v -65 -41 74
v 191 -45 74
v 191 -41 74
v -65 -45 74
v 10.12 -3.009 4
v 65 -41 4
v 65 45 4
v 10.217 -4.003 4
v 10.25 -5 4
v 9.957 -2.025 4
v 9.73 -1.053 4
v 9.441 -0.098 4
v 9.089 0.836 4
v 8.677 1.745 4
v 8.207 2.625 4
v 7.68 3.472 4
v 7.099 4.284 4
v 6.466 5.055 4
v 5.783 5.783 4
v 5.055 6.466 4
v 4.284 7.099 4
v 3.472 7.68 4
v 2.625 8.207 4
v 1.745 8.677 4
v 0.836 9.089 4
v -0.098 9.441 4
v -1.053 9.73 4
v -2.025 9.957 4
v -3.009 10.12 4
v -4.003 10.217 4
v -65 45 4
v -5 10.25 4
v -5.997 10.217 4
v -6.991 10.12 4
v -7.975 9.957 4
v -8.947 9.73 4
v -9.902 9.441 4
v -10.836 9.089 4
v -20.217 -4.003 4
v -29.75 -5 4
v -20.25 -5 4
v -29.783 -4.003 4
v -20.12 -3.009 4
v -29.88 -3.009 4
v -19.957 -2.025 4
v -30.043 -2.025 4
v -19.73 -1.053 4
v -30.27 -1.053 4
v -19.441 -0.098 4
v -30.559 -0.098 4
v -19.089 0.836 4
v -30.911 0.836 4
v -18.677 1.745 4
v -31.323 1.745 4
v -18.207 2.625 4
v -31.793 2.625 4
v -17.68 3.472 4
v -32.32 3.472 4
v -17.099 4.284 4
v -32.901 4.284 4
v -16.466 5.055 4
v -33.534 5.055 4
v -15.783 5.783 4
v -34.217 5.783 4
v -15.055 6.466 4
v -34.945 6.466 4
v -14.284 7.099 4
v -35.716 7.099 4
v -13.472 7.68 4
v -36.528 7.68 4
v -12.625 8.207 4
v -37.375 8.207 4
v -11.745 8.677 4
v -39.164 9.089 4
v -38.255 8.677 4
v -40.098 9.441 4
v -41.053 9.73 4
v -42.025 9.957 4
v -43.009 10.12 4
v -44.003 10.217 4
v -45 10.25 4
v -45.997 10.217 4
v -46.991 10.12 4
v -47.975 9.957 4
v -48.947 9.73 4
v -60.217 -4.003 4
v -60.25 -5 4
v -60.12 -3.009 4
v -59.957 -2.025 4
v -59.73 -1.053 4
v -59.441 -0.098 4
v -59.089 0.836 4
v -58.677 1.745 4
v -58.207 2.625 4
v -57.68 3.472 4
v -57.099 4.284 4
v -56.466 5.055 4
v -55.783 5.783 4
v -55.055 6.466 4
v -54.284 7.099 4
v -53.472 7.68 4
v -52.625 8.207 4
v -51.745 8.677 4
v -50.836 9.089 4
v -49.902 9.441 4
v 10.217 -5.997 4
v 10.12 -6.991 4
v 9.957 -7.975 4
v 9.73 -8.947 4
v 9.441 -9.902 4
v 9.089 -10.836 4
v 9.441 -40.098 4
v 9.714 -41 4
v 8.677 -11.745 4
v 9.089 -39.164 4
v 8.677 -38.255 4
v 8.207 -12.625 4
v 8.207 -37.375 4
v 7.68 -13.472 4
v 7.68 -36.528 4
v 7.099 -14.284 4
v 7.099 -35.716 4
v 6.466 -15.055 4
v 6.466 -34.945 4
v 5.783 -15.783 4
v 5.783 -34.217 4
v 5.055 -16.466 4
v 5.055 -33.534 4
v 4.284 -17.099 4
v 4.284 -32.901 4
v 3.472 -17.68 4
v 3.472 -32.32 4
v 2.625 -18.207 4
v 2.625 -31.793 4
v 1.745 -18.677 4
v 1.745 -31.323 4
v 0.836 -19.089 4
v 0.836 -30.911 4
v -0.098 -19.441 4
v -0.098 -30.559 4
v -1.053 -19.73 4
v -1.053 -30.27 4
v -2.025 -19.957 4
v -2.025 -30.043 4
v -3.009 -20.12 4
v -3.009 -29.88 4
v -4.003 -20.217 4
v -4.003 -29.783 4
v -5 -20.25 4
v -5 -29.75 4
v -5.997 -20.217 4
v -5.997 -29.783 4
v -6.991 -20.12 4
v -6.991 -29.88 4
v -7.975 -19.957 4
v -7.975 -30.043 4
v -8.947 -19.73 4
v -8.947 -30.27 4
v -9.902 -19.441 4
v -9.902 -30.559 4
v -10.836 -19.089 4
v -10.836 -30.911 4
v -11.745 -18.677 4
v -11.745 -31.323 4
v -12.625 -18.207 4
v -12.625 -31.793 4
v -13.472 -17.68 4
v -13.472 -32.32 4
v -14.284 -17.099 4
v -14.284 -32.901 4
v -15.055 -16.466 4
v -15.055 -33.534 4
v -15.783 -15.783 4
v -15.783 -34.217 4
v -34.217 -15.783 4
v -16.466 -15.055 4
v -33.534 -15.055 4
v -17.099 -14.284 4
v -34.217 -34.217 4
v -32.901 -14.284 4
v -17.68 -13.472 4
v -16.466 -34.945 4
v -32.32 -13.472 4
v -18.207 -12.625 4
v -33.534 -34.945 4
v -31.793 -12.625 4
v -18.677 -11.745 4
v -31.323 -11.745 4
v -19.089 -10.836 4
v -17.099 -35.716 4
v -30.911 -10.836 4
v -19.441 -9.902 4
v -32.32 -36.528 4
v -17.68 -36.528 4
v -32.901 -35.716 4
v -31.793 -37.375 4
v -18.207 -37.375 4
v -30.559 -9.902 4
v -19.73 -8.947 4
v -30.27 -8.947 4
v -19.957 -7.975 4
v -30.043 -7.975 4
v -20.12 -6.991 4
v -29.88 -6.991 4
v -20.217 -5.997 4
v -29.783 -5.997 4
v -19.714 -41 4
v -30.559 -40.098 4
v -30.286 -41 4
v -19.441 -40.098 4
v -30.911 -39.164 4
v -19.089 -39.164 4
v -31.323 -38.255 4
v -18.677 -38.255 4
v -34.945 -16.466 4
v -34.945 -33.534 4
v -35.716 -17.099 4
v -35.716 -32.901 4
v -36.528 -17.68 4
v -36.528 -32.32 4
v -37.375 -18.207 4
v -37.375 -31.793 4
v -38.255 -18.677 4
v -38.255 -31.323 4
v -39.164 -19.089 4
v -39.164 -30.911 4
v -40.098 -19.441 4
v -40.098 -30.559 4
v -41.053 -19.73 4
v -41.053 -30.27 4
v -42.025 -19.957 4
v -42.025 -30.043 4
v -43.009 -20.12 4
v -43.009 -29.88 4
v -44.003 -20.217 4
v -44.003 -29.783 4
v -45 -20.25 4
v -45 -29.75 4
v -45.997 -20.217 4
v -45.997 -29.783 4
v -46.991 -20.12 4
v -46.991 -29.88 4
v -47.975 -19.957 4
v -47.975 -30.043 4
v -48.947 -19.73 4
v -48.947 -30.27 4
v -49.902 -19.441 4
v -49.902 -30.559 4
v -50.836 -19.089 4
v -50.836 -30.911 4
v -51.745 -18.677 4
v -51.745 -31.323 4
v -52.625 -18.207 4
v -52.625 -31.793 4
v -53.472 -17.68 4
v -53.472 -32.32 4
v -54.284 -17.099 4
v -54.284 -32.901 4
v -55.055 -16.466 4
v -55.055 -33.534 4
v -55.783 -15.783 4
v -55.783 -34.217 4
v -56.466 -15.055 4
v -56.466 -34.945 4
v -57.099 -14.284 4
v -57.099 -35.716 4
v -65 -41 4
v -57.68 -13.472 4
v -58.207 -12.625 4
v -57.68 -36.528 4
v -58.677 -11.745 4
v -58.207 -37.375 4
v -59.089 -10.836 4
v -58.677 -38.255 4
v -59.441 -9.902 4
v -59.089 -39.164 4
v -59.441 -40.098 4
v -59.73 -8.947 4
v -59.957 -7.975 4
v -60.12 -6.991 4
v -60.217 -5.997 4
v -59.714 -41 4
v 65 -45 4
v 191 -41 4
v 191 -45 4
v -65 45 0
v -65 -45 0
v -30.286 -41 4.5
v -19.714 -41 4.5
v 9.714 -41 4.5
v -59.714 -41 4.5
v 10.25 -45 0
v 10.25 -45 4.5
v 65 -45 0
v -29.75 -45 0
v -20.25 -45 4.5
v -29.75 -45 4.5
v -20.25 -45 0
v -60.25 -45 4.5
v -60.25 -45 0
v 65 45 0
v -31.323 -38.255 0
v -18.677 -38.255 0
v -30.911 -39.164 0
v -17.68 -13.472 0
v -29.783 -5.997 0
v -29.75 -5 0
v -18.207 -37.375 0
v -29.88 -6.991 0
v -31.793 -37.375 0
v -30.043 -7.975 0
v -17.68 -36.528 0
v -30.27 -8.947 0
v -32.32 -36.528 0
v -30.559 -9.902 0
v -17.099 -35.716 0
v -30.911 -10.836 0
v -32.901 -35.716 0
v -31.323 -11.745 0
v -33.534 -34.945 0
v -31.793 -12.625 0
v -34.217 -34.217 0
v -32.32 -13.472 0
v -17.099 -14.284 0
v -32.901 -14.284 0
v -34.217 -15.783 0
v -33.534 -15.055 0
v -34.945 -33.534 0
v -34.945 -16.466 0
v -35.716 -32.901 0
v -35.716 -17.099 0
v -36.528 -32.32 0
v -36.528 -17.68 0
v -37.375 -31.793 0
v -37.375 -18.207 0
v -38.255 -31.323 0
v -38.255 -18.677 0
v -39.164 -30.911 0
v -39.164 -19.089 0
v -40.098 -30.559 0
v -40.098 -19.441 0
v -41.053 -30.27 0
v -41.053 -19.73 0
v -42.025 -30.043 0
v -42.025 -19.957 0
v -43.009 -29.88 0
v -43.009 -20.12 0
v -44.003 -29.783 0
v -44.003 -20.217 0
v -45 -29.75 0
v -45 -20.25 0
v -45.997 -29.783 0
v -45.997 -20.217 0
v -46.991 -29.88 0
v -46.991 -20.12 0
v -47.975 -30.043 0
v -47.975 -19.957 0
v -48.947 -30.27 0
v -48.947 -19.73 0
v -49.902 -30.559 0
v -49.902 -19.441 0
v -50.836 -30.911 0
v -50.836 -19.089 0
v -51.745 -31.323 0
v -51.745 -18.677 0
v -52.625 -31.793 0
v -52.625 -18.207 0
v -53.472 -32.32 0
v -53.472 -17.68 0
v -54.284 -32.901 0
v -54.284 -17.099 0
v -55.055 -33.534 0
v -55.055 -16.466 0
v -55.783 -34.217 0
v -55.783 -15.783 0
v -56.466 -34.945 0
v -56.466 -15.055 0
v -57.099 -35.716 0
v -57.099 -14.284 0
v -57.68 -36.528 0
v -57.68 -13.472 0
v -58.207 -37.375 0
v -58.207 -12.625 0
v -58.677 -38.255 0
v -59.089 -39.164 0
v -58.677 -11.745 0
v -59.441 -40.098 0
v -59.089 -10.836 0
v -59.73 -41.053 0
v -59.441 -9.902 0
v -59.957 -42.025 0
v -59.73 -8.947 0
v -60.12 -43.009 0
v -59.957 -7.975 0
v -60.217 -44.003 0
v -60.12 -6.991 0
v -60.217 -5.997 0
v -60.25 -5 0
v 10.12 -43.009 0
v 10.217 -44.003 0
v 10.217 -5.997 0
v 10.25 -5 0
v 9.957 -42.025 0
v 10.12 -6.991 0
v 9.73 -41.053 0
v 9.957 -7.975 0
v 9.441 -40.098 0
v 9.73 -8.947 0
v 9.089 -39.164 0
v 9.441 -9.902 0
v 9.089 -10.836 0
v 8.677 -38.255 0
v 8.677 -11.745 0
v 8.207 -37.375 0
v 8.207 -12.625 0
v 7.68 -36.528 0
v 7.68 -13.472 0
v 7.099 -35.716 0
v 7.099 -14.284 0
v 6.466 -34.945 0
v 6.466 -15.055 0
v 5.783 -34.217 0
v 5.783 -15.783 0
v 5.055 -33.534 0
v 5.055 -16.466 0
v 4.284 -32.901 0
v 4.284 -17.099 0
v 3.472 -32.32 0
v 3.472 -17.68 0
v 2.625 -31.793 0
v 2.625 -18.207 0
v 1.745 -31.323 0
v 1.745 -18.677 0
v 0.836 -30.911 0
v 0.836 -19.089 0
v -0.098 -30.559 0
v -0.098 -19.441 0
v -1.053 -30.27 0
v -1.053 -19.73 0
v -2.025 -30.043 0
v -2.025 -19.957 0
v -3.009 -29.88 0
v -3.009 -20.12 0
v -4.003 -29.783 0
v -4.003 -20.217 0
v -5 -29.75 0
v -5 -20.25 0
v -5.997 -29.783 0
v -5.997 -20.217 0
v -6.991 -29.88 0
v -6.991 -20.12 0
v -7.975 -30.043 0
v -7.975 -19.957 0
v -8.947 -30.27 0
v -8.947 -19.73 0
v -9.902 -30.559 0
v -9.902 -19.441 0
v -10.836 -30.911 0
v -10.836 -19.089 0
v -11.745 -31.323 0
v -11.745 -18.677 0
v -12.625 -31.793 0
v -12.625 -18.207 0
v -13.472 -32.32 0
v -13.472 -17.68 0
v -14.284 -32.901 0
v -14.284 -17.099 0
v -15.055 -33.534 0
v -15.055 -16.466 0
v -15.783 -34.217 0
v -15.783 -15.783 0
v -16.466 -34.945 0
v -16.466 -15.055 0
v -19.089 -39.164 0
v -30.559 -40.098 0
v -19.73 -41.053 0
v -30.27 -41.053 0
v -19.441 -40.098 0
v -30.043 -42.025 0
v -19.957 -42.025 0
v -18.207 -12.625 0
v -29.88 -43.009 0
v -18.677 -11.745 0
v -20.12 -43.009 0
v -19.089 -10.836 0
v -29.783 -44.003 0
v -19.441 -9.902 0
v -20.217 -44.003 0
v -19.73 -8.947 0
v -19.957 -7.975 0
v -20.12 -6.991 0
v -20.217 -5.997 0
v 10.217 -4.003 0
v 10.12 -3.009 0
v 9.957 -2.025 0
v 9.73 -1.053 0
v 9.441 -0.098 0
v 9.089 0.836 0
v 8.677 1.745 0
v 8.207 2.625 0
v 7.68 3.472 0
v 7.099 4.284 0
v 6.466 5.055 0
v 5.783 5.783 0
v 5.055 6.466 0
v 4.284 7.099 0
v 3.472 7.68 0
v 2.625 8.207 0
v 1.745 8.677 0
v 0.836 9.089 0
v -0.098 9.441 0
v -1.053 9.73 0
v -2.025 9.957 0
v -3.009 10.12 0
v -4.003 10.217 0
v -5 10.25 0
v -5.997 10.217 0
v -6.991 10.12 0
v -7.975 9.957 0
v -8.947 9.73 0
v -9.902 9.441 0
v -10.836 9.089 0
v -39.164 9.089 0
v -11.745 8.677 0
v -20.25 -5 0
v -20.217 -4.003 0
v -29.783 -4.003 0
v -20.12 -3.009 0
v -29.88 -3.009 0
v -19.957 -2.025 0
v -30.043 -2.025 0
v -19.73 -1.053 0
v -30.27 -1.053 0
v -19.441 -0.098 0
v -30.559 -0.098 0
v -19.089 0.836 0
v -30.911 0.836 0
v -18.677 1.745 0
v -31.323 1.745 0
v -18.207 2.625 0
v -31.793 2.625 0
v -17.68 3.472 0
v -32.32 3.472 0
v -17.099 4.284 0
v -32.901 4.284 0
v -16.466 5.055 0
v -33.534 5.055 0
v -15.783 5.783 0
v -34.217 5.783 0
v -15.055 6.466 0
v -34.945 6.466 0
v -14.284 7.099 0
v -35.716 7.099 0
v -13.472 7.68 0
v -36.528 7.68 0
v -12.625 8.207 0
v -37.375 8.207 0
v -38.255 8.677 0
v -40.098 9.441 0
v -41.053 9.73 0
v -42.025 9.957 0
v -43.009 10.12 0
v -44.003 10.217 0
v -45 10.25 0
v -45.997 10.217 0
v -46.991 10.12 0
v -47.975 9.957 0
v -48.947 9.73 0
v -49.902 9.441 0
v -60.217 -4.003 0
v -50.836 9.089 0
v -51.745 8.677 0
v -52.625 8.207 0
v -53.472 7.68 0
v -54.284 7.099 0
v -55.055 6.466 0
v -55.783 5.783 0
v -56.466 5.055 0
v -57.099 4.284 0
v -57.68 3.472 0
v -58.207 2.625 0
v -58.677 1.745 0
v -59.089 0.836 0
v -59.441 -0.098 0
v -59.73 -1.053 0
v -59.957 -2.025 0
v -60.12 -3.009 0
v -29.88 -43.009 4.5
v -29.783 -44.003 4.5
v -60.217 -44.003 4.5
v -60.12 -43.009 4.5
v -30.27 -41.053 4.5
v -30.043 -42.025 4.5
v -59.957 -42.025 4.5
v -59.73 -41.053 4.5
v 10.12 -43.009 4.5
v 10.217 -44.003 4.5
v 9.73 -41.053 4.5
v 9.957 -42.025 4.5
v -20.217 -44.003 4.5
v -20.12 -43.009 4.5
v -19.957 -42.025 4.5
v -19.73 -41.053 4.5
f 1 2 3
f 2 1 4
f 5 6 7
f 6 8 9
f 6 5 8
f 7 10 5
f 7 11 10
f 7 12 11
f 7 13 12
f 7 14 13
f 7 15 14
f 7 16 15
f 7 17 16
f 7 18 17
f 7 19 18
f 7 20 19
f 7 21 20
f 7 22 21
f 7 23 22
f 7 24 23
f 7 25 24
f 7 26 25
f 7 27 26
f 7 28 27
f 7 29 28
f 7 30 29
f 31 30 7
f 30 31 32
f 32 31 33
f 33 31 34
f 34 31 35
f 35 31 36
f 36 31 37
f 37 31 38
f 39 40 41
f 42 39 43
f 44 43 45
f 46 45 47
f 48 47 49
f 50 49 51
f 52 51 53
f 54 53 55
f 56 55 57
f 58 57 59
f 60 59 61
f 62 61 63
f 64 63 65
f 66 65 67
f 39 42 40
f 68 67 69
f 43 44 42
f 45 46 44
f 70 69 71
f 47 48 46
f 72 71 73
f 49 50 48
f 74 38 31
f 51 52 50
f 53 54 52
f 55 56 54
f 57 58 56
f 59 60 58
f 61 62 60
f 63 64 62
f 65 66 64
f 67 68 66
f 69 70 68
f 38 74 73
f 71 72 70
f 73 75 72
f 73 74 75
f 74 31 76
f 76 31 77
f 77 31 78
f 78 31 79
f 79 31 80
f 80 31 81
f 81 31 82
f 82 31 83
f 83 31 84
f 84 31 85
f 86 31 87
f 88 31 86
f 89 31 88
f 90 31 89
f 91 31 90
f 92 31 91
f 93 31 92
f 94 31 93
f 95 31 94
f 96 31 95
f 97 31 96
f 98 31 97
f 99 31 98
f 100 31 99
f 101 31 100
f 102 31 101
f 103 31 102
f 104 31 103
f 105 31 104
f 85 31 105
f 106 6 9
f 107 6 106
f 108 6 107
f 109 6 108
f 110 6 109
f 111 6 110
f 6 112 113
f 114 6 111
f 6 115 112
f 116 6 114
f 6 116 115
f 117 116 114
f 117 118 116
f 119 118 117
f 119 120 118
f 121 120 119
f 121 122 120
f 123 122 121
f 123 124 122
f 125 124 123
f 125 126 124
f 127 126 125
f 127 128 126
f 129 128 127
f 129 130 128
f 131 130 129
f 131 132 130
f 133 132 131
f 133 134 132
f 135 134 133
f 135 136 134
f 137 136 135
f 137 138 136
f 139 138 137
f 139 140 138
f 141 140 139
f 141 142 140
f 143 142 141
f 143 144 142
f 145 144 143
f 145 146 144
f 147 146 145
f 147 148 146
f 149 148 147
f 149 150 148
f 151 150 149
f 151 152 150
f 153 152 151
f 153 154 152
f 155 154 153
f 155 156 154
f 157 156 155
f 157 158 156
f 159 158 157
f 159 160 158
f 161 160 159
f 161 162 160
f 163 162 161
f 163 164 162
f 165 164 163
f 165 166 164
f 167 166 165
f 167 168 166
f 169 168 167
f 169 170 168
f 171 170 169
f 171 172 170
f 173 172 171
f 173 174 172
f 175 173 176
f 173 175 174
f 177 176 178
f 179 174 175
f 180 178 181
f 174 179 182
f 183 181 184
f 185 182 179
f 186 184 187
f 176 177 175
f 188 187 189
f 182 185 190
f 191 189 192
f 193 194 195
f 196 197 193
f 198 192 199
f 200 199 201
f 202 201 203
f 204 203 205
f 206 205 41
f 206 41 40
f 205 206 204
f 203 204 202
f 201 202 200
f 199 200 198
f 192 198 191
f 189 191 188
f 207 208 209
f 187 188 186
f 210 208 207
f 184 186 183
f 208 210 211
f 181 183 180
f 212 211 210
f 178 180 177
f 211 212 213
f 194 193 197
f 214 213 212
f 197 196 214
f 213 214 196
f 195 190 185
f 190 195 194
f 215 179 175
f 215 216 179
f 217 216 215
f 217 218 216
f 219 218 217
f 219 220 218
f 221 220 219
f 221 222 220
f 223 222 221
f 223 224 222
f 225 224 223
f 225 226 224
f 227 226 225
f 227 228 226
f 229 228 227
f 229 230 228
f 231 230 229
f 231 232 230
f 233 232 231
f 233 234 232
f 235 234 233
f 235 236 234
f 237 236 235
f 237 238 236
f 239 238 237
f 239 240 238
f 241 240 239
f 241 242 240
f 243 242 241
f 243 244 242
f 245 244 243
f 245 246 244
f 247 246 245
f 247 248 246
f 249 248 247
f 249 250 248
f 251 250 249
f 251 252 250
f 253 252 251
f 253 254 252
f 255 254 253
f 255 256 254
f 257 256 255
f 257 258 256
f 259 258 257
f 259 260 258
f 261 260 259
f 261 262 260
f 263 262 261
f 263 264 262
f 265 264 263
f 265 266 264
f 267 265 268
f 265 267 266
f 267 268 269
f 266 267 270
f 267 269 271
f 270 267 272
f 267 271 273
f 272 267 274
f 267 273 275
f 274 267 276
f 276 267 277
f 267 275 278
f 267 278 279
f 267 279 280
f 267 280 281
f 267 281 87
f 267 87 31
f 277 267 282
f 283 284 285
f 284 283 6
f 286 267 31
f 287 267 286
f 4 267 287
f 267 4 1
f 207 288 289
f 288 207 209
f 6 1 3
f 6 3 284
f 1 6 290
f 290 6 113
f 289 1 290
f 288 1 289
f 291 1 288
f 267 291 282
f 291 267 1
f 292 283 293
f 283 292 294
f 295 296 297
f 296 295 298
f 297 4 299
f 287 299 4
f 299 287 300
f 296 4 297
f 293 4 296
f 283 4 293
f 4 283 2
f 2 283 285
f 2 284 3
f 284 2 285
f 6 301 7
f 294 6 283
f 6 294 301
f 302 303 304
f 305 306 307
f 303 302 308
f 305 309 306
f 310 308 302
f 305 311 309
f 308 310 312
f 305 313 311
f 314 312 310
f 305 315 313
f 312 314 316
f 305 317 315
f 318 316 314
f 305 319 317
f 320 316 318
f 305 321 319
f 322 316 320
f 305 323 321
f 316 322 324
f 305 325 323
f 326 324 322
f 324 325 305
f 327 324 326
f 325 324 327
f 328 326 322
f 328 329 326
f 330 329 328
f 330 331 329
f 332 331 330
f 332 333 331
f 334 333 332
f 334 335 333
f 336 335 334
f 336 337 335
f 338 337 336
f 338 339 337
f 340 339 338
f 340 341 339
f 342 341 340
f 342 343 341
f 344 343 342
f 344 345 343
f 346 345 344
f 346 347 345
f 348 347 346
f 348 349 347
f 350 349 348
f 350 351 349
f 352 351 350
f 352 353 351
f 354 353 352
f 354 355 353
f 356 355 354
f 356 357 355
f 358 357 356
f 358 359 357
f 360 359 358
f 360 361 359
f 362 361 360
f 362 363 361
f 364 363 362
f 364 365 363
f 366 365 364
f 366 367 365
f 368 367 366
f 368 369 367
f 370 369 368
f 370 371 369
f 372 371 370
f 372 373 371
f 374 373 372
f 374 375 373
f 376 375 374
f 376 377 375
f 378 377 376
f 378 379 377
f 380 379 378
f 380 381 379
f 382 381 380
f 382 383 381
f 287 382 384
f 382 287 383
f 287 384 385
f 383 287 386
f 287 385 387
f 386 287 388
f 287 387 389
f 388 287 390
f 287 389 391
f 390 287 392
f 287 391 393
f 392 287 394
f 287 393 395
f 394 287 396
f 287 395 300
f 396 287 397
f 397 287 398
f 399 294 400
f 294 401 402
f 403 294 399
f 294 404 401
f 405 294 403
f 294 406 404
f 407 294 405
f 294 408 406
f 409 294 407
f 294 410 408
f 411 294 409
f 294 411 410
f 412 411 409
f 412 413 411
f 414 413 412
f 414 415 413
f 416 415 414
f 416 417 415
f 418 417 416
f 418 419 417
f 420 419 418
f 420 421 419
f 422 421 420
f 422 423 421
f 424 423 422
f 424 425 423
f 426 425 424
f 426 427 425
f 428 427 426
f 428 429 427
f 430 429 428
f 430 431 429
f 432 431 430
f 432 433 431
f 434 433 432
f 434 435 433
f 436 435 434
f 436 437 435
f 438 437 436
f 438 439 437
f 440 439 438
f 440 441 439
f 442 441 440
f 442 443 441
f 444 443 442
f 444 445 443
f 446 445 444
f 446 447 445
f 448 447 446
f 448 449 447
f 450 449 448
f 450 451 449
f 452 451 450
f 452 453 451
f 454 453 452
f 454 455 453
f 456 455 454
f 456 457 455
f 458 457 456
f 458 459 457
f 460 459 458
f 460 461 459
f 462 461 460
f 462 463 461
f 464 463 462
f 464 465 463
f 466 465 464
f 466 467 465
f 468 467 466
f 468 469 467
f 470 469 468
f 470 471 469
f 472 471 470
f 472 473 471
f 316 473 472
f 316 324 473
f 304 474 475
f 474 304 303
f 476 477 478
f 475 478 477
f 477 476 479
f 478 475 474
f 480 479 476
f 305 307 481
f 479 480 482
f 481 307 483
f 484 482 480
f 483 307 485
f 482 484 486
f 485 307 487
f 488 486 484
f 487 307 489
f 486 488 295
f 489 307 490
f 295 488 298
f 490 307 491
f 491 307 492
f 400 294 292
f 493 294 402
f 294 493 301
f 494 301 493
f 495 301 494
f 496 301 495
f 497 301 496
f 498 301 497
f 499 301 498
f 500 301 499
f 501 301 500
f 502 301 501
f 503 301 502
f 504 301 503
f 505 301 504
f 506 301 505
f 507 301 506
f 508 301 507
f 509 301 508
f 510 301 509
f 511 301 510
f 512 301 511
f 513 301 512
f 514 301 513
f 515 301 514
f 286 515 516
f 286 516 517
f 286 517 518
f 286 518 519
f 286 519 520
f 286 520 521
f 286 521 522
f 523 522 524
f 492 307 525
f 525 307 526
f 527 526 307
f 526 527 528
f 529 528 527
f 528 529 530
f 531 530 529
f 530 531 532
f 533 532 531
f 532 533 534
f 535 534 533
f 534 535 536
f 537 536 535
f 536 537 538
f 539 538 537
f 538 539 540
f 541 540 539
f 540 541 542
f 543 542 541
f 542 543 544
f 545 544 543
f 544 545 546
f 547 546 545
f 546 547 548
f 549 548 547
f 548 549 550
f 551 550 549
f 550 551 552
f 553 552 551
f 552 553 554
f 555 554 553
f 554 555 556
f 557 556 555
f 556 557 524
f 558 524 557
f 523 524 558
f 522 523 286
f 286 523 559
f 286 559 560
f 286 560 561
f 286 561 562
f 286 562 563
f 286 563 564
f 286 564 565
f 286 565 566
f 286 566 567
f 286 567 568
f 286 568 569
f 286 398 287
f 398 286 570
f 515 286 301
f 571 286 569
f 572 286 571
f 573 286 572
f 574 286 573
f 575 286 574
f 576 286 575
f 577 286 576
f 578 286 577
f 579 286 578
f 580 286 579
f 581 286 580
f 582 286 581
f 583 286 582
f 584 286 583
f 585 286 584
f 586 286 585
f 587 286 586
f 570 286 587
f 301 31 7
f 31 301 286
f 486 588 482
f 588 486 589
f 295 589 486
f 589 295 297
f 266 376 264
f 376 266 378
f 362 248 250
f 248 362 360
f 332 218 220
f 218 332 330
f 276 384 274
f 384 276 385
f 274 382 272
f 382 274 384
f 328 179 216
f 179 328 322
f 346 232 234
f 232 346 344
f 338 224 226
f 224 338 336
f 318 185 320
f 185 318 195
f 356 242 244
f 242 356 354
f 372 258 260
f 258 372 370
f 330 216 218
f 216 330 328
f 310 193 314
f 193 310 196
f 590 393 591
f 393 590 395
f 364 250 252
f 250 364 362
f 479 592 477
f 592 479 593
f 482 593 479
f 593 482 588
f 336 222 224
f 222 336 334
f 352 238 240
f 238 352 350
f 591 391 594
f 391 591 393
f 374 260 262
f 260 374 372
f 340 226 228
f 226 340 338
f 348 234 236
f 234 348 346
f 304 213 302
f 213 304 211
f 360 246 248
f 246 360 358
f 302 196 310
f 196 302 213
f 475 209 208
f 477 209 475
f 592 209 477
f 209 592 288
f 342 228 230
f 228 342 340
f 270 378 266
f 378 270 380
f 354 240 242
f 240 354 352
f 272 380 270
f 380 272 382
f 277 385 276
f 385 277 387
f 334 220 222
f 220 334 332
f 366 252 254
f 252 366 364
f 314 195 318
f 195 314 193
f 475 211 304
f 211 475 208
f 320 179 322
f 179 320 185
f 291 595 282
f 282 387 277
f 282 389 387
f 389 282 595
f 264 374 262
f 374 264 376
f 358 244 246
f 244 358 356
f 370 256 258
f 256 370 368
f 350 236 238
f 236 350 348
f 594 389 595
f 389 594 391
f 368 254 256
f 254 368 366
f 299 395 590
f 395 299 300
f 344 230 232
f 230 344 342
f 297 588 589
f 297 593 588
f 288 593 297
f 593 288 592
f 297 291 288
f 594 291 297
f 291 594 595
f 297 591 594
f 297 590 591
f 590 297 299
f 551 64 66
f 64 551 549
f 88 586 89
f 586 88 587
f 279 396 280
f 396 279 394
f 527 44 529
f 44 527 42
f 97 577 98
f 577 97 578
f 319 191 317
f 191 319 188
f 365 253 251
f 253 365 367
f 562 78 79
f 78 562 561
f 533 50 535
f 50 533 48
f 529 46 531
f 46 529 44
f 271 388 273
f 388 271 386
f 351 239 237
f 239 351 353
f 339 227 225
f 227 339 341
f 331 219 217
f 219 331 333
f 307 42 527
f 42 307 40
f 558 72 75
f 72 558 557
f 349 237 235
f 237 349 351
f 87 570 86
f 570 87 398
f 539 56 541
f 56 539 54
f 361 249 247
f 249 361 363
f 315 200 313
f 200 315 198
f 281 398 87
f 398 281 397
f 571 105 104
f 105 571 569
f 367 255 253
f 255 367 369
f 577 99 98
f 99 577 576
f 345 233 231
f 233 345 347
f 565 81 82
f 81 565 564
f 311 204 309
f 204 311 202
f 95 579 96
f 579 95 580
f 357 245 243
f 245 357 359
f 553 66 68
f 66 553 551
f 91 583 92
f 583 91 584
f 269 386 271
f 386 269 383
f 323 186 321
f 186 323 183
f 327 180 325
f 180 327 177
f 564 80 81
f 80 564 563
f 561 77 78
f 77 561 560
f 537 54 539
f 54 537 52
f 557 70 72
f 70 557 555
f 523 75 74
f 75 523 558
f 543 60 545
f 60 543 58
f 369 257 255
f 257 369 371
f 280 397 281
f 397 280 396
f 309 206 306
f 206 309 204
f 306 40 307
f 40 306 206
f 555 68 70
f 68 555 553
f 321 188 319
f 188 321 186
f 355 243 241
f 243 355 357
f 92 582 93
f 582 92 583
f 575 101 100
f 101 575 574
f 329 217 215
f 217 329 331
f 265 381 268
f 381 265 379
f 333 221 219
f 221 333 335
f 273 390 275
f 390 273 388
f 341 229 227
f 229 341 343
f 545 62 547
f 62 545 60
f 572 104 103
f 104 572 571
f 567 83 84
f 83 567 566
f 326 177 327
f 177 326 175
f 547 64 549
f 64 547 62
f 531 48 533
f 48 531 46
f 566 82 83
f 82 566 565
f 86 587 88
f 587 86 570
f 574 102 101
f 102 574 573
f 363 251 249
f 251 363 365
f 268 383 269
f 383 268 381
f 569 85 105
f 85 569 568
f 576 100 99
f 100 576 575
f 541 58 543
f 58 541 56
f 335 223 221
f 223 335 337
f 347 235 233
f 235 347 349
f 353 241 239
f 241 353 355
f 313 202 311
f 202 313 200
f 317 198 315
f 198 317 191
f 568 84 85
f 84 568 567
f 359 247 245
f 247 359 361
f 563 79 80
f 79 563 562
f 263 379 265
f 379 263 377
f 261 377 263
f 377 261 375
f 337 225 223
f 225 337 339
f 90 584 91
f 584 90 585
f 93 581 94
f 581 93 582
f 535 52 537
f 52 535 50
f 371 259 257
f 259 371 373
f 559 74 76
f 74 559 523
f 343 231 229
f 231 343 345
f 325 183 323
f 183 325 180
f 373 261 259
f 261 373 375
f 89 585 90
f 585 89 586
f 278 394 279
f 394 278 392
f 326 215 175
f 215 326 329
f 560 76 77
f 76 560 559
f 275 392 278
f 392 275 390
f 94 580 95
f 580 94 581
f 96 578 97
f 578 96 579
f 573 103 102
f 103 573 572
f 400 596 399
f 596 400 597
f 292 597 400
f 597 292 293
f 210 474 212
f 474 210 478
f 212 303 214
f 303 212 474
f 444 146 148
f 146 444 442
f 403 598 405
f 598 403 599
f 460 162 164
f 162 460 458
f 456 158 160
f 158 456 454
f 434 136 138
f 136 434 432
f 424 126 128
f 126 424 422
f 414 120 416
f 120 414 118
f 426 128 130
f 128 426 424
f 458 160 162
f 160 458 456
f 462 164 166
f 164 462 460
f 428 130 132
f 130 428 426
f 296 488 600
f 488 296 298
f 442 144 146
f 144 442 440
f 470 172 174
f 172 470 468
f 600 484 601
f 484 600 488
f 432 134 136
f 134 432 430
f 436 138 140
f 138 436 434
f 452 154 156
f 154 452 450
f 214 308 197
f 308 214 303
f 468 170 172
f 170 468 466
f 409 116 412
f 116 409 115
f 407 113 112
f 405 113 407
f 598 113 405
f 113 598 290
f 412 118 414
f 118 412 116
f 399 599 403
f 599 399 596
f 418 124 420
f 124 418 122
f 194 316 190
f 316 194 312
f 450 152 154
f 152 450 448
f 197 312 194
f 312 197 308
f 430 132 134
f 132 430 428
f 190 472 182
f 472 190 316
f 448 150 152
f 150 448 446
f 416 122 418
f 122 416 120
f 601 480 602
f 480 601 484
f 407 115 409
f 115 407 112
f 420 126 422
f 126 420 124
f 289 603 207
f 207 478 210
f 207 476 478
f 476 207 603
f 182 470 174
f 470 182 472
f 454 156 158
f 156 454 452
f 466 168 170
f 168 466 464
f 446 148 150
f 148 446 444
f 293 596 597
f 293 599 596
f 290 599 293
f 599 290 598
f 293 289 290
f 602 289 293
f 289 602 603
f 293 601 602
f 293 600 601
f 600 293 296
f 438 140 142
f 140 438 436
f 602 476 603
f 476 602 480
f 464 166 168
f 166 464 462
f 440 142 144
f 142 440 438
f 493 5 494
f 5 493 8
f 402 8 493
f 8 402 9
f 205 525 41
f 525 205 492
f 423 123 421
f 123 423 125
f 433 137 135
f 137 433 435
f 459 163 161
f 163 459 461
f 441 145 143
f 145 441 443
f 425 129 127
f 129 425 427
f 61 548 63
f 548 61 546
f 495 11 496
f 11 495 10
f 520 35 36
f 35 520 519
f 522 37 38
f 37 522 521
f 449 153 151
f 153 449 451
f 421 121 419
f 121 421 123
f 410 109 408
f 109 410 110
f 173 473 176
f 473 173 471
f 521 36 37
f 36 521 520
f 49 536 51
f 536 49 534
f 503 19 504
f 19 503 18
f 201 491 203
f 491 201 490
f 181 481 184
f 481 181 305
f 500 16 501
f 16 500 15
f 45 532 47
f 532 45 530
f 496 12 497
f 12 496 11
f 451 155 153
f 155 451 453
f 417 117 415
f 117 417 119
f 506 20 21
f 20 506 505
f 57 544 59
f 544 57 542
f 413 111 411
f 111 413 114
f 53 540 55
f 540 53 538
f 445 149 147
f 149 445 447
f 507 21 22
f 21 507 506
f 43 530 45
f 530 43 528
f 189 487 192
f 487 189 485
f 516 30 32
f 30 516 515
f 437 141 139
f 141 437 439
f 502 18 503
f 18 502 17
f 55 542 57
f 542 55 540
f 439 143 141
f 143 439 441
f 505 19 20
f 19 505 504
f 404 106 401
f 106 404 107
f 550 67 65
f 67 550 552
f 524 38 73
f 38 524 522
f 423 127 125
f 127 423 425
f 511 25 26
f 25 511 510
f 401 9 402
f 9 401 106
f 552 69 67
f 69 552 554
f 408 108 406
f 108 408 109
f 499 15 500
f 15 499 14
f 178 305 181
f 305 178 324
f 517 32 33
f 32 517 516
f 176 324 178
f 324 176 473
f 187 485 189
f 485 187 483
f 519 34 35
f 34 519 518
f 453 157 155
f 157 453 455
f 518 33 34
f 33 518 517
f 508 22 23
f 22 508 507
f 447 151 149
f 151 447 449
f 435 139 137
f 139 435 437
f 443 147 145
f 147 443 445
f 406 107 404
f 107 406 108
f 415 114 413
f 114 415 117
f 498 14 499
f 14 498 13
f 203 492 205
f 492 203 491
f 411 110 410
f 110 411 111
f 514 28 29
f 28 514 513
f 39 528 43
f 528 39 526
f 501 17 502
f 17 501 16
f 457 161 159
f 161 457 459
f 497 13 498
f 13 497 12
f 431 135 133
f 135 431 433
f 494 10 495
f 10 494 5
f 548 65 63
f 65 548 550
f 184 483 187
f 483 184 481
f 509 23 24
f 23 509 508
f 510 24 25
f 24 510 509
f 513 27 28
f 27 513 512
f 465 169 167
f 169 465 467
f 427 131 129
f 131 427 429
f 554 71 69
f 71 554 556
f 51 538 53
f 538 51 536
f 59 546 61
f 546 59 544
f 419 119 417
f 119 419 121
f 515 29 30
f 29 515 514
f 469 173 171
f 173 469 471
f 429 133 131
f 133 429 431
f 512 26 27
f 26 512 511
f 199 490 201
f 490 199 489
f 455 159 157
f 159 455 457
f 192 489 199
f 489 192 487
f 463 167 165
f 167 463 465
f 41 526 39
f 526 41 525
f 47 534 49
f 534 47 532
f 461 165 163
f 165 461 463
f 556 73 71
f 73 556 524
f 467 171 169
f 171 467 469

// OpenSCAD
// Rack for six 50 mL conical (Falcon-type) tubes
// Print orientation: flat plate on bed, walls rising to z = 70
// After printing, flip over so the rack stands on the walls

// ---------- Parameters ----------
plate_x      = 130;   // plate length along X
plate_y      = 90;    // plate width along Y
plate_t      = 4;     // plate thickness (z = 0 to 4)

hole_d       = 30.5;  // through-hole diameter
hole_nx      = 3;     // holes along X
hole_ny      = 2;     // holes along Y
hole_pitch   = 40;    // centre-to-centre spacing (both directions)

wall_t       = 4;     // wall thickness (Y)
wall_h       = 70;    // wall height from plate top (z = 4 to 74)

eps          = 0.5;   // cutter overshoot past faces
$fn          = 96;    // circle resolution

// ---------- Model ----------
difference() {
    union() {
        // Base plate
        translate([-plate_x/2, -plate_y/2, 0])
            cube([plate_x, plate_y, plate_t]);

        // Two long walls, flush with plate edges
        for (s = [-1, 1])
            translate([s > 0 ? plate_x/2 - wall_t : -plate_x/2,
                       -plate_y/2,
                       plate_t])
                cube([plate_x, wall_t, wall_h]);
    }

    // Through-holes, centred on plate
    for (i = [0 : hole_nx - 1])
        for (j = [0 : hole_ny - 1])
            translate([(i - (hole_nx - 1)/2) * hole_pitch - plate_x/2 + hole_pitch/2,
                       (j - (hole_ny - 1)/2) * hole_pitch - plate_y/2 + hole_pitch/2,
                       -eps])
                cylinder(d = hole_d, h = plate_t + 2 * eps);
}
